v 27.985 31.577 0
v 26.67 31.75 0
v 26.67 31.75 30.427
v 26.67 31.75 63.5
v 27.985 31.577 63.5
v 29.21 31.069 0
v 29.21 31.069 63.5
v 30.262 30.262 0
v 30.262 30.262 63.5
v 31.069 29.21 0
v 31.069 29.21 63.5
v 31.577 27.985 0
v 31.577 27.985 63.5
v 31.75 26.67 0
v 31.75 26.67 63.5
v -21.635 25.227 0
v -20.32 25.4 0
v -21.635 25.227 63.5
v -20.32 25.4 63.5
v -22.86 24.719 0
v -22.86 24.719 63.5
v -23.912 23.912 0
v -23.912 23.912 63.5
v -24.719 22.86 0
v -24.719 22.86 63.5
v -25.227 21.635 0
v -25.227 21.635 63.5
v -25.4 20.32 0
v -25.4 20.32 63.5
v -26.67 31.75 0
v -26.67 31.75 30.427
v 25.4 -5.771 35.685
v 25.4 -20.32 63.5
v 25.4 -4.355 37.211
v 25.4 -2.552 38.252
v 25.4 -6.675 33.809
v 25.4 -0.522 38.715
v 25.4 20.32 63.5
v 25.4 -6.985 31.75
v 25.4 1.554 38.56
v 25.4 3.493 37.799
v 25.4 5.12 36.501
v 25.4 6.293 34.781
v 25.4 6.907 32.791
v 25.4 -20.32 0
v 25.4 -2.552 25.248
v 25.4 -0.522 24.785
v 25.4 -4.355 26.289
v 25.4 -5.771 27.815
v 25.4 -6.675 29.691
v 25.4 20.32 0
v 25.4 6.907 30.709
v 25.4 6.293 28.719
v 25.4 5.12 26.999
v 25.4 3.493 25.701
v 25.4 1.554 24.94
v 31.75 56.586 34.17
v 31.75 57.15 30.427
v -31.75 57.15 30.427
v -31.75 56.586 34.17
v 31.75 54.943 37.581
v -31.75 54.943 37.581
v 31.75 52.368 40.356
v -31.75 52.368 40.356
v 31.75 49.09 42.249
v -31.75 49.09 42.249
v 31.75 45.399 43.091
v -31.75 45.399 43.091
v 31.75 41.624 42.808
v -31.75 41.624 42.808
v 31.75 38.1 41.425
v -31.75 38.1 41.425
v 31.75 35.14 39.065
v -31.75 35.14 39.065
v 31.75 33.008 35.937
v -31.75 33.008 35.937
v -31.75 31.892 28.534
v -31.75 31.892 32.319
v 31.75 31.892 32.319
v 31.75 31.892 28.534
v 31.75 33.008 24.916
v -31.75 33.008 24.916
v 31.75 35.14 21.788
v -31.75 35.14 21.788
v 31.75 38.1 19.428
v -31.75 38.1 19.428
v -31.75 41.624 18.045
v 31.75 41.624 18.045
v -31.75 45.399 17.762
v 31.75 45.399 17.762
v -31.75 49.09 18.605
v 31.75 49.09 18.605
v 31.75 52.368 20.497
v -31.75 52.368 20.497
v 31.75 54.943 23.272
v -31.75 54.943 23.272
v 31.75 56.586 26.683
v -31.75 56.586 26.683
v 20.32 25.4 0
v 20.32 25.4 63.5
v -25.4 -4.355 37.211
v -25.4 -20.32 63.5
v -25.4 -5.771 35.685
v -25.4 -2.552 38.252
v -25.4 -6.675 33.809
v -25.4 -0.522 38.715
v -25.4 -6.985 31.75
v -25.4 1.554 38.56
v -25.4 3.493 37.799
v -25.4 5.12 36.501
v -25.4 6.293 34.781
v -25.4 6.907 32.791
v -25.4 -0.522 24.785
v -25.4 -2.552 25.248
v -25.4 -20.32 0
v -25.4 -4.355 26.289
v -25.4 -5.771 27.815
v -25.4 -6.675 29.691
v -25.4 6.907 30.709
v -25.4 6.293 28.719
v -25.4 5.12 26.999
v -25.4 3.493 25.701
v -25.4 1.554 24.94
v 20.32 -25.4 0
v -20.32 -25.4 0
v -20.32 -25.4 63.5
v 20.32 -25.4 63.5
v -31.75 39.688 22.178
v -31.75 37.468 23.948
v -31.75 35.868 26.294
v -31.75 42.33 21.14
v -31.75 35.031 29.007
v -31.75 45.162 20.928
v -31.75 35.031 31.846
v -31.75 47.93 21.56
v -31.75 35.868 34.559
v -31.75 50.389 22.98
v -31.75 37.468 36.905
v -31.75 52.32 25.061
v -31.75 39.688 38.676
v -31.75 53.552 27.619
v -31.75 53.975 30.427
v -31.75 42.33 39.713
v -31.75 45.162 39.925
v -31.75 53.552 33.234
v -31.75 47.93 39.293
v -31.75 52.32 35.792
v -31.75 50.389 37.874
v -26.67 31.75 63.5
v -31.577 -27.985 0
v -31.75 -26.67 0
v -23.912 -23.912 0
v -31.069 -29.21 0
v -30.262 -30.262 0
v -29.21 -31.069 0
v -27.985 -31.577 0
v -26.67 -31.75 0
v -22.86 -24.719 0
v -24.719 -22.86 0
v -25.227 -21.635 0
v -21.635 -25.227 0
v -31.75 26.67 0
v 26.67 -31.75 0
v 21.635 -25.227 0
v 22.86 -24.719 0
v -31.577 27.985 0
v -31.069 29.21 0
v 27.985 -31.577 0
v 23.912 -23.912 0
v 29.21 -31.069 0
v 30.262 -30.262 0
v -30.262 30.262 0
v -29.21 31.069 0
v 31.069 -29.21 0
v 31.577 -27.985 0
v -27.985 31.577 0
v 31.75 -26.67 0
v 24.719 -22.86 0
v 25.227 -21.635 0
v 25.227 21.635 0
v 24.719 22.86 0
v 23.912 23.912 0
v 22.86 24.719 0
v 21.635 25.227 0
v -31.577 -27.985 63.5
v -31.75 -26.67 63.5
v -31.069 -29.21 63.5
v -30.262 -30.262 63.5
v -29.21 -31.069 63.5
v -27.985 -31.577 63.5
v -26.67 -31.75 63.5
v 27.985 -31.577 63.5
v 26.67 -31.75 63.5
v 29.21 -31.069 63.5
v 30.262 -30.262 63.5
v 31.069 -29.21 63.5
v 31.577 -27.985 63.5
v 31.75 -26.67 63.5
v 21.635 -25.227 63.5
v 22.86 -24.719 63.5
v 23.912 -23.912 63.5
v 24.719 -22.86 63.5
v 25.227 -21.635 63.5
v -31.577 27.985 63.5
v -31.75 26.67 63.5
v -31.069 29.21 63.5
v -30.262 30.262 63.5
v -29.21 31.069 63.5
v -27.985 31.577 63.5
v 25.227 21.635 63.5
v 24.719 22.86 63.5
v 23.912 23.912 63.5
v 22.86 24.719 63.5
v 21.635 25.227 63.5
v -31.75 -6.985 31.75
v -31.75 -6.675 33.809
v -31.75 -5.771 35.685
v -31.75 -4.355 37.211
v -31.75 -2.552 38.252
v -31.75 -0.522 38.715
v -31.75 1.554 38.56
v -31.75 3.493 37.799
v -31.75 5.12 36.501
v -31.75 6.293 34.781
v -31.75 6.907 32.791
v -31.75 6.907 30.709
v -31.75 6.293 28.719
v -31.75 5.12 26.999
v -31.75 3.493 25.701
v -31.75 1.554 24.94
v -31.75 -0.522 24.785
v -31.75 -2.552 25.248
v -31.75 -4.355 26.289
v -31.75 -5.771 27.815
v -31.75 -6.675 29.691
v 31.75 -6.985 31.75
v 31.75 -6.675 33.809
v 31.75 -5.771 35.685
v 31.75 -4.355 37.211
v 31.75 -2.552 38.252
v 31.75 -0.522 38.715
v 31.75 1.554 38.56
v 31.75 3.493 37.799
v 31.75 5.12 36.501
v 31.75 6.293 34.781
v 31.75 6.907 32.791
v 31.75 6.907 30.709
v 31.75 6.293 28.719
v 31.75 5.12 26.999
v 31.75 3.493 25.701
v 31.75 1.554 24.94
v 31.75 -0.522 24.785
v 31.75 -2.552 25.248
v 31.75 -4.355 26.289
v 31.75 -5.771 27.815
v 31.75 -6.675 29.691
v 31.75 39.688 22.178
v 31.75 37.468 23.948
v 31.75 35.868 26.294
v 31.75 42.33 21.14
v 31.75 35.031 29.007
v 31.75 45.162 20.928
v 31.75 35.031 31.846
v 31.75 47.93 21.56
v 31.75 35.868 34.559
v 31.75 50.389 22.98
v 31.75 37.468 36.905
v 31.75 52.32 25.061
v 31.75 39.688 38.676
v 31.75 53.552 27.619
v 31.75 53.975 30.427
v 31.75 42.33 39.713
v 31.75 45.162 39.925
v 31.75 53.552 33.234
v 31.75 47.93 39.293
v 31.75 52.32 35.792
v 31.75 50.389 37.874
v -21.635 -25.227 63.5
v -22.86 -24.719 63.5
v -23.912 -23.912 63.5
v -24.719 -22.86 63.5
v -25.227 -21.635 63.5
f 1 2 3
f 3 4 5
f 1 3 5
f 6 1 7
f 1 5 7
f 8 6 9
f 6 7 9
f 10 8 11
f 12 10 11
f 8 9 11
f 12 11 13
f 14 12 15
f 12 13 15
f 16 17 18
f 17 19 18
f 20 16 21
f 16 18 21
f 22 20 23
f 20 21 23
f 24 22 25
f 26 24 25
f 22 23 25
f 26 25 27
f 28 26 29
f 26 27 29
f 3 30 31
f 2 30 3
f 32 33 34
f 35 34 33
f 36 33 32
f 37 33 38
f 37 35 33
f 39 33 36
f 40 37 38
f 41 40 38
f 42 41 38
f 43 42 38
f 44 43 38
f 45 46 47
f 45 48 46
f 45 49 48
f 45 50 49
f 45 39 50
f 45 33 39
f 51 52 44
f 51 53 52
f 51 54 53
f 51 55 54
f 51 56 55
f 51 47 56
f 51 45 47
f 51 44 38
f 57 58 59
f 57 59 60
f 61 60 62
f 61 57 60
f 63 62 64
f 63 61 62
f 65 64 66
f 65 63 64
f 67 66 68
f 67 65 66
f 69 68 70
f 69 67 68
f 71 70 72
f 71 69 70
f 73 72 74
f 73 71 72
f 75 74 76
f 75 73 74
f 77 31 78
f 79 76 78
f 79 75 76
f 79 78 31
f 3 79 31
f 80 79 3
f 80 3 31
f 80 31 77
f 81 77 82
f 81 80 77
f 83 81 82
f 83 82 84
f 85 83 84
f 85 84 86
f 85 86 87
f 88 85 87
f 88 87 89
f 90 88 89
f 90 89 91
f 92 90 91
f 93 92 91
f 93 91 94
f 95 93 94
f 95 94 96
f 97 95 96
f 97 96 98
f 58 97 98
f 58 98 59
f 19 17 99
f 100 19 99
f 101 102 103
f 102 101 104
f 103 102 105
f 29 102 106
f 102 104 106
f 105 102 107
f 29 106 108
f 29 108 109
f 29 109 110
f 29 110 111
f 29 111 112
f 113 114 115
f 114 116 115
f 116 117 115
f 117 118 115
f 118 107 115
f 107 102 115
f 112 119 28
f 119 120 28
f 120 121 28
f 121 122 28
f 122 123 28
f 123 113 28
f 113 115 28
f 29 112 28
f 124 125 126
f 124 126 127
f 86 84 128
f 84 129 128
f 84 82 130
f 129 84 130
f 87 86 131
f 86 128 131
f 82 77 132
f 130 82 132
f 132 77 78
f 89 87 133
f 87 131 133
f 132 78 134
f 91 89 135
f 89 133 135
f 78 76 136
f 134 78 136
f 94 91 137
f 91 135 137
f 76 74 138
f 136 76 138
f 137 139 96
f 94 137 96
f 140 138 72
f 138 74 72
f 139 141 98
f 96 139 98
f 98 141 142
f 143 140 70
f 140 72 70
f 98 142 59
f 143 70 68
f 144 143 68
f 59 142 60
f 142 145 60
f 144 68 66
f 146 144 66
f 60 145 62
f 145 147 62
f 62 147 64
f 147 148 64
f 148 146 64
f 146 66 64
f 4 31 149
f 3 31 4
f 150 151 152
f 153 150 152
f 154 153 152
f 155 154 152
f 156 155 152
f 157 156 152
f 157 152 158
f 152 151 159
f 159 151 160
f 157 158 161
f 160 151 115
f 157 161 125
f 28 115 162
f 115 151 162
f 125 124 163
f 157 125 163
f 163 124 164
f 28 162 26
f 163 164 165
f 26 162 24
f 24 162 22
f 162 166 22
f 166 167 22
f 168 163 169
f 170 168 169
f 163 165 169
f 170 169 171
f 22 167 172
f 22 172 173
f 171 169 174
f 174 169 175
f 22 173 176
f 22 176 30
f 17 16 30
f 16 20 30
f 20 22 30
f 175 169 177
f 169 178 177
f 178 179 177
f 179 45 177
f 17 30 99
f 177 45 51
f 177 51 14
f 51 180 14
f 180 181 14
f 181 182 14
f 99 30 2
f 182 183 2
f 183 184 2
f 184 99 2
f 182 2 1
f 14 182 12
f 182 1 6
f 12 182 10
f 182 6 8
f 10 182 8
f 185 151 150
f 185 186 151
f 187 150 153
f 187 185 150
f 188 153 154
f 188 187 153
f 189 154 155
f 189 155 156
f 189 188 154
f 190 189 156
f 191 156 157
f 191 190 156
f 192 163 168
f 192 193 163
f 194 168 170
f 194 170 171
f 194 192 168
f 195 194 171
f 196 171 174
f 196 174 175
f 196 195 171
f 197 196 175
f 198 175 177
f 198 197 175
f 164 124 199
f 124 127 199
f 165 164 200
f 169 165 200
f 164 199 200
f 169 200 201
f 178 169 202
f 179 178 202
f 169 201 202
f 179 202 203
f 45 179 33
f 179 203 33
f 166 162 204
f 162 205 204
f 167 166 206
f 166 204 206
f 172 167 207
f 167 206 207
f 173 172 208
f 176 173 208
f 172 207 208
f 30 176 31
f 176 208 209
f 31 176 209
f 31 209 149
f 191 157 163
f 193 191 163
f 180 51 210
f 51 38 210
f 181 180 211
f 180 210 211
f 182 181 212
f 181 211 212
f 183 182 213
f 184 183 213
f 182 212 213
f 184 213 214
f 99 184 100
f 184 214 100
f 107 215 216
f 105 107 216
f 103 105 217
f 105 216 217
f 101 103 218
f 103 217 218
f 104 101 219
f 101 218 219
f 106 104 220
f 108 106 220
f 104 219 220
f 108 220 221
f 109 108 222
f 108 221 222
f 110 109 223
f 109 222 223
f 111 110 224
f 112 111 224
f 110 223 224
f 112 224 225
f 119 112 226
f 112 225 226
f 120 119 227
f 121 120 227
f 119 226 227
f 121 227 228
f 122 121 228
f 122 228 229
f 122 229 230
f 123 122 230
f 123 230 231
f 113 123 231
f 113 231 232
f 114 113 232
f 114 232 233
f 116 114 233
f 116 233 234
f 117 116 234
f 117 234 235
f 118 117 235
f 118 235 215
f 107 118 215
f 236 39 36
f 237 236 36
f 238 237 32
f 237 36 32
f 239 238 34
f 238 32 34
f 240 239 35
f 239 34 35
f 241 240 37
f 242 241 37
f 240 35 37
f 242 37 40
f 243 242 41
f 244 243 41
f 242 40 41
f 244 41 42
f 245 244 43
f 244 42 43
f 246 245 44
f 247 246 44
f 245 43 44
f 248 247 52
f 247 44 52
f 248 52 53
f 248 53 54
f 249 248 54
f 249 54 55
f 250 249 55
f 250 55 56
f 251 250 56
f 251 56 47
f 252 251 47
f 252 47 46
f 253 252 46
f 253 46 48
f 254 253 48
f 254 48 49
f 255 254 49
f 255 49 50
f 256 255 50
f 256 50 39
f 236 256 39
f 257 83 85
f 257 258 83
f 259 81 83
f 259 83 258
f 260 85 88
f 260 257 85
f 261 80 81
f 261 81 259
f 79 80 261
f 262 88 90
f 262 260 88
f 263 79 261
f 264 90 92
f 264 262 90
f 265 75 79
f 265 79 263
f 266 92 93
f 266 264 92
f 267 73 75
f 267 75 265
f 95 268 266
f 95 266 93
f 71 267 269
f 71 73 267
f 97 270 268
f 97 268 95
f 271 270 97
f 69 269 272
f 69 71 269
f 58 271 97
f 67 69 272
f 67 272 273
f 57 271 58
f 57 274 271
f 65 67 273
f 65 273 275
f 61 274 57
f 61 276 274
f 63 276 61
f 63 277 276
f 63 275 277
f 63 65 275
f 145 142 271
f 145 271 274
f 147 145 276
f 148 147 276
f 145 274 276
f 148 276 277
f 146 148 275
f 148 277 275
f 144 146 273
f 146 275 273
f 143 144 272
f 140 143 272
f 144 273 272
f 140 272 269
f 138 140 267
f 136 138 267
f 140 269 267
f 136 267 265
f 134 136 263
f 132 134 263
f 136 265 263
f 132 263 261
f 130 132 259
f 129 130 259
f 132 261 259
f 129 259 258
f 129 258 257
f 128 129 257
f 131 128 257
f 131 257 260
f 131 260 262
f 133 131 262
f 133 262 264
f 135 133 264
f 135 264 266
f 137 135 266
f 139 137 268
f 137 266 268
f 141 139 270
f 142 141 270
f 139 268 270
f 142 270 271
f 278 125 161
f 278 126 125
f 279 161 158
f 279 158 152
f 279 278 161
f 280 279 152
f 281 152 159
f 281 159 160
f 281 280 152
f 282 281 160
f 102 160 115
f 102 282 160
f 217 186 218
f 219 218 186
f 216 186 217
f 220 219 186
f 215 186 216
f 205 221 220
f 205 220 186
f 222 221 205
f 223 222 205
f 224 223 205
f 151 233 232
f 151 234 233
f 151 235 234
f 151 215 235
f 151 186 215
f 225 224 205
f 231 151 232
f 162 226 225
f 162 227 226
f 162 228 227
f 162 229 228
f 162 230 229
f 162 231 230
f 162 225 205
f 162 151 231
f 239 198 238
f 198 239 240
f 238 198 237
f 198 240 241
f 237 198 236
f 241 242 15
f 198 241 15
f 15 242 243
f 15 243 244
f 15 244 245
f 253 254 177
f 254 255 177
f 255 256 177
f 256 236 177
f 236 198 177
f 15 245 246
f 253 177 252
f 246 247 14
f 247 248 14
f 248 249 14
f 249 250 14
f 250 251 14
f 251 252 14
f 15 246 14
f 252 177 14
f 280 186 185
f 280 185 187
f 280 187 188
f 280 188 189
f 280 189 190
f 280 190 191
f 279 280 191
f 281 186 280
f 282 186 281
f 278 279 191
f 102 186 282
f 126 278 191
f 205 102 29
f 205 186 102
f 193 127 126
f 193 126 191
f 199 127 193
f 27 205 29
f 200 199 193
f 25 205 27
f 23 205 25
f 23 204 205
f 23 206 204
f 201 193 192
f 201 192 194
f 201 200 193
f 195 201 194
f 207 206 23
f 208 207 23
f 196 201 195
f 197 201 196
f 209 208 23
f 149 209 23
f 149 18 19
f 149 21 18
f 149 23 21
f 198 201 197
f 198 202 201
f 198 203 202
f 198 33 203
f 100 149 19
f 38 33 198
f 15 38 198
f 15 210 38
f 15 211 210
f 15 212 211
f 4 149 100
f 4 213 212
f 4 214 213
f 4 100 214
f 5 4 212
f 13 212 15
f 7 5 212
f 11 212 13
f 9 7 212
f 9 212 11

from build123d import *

# Parameters (mm, degrees)
F0_W     = 63.5
F0_H     = 63.5
F0_W_2   = 50.8
F0_H_2   = 50.8
F1_DEPTH = 63.5
F2_R     = 5.08
F3_R     = 6.985
F4_DEPTH = 63.5
F5_R     = 12.7
F5_R_2   = 9.525
F6_DEPTH = 63.5


with BuildPart() as f1:
    # F0 (on Top) → F1 (new body)
    with BuildSketch(Plane.XY):
        Rectangle(F0_W, F0_H)
        Rectangle(F0_W_2, F0_H_2, mode=Mode.SUBTRACT)
    extrude(amount=F1_DEPTH)

    # F2
    f2_edges = [f1.edges().sort_by_distance(p)[0] for p in [
        (31.75, -31.75, 31.75),
        (-31.75, -31.75, 31.75),
        (-31.75, 31.75, 31.75),
        (31.75, 31.75, 31.75),
        (25.4, -25.4, 31.75),
        (25.4, 25.4, 31.75),
        (-25.4, 25.4, 31.75),
        (-25.4, -25.4, 31.75),
    ]]
    fillet(f2_edges, radius=F2_R)

    # F3 (on face) → F4 (cut)
    with BuildSketch(Plane(origin=(-31.75, 0, 0), x_dir=(0, -1, 0), z_dir=(-1, 0, 0))):
        with Locations((0, 31.75)):
            Circle(F3_R)
    extrude(amount=-F4_DEPTH, mode=Mode.SUBTRACT)

    # F5 (on face) → F6 (join)
    with BuildSketch(Plane.YZ.offset(31.75)):
        with Locations((44.45, 30.426636)):
            Circle(F5_R)
        with Locations((44.45, 30.426636)):
            Circle(F5_R_2, mode=Mode.SUBTRACT)
    extrude(amount=-F6_DEPTH)


solid = f1.part
